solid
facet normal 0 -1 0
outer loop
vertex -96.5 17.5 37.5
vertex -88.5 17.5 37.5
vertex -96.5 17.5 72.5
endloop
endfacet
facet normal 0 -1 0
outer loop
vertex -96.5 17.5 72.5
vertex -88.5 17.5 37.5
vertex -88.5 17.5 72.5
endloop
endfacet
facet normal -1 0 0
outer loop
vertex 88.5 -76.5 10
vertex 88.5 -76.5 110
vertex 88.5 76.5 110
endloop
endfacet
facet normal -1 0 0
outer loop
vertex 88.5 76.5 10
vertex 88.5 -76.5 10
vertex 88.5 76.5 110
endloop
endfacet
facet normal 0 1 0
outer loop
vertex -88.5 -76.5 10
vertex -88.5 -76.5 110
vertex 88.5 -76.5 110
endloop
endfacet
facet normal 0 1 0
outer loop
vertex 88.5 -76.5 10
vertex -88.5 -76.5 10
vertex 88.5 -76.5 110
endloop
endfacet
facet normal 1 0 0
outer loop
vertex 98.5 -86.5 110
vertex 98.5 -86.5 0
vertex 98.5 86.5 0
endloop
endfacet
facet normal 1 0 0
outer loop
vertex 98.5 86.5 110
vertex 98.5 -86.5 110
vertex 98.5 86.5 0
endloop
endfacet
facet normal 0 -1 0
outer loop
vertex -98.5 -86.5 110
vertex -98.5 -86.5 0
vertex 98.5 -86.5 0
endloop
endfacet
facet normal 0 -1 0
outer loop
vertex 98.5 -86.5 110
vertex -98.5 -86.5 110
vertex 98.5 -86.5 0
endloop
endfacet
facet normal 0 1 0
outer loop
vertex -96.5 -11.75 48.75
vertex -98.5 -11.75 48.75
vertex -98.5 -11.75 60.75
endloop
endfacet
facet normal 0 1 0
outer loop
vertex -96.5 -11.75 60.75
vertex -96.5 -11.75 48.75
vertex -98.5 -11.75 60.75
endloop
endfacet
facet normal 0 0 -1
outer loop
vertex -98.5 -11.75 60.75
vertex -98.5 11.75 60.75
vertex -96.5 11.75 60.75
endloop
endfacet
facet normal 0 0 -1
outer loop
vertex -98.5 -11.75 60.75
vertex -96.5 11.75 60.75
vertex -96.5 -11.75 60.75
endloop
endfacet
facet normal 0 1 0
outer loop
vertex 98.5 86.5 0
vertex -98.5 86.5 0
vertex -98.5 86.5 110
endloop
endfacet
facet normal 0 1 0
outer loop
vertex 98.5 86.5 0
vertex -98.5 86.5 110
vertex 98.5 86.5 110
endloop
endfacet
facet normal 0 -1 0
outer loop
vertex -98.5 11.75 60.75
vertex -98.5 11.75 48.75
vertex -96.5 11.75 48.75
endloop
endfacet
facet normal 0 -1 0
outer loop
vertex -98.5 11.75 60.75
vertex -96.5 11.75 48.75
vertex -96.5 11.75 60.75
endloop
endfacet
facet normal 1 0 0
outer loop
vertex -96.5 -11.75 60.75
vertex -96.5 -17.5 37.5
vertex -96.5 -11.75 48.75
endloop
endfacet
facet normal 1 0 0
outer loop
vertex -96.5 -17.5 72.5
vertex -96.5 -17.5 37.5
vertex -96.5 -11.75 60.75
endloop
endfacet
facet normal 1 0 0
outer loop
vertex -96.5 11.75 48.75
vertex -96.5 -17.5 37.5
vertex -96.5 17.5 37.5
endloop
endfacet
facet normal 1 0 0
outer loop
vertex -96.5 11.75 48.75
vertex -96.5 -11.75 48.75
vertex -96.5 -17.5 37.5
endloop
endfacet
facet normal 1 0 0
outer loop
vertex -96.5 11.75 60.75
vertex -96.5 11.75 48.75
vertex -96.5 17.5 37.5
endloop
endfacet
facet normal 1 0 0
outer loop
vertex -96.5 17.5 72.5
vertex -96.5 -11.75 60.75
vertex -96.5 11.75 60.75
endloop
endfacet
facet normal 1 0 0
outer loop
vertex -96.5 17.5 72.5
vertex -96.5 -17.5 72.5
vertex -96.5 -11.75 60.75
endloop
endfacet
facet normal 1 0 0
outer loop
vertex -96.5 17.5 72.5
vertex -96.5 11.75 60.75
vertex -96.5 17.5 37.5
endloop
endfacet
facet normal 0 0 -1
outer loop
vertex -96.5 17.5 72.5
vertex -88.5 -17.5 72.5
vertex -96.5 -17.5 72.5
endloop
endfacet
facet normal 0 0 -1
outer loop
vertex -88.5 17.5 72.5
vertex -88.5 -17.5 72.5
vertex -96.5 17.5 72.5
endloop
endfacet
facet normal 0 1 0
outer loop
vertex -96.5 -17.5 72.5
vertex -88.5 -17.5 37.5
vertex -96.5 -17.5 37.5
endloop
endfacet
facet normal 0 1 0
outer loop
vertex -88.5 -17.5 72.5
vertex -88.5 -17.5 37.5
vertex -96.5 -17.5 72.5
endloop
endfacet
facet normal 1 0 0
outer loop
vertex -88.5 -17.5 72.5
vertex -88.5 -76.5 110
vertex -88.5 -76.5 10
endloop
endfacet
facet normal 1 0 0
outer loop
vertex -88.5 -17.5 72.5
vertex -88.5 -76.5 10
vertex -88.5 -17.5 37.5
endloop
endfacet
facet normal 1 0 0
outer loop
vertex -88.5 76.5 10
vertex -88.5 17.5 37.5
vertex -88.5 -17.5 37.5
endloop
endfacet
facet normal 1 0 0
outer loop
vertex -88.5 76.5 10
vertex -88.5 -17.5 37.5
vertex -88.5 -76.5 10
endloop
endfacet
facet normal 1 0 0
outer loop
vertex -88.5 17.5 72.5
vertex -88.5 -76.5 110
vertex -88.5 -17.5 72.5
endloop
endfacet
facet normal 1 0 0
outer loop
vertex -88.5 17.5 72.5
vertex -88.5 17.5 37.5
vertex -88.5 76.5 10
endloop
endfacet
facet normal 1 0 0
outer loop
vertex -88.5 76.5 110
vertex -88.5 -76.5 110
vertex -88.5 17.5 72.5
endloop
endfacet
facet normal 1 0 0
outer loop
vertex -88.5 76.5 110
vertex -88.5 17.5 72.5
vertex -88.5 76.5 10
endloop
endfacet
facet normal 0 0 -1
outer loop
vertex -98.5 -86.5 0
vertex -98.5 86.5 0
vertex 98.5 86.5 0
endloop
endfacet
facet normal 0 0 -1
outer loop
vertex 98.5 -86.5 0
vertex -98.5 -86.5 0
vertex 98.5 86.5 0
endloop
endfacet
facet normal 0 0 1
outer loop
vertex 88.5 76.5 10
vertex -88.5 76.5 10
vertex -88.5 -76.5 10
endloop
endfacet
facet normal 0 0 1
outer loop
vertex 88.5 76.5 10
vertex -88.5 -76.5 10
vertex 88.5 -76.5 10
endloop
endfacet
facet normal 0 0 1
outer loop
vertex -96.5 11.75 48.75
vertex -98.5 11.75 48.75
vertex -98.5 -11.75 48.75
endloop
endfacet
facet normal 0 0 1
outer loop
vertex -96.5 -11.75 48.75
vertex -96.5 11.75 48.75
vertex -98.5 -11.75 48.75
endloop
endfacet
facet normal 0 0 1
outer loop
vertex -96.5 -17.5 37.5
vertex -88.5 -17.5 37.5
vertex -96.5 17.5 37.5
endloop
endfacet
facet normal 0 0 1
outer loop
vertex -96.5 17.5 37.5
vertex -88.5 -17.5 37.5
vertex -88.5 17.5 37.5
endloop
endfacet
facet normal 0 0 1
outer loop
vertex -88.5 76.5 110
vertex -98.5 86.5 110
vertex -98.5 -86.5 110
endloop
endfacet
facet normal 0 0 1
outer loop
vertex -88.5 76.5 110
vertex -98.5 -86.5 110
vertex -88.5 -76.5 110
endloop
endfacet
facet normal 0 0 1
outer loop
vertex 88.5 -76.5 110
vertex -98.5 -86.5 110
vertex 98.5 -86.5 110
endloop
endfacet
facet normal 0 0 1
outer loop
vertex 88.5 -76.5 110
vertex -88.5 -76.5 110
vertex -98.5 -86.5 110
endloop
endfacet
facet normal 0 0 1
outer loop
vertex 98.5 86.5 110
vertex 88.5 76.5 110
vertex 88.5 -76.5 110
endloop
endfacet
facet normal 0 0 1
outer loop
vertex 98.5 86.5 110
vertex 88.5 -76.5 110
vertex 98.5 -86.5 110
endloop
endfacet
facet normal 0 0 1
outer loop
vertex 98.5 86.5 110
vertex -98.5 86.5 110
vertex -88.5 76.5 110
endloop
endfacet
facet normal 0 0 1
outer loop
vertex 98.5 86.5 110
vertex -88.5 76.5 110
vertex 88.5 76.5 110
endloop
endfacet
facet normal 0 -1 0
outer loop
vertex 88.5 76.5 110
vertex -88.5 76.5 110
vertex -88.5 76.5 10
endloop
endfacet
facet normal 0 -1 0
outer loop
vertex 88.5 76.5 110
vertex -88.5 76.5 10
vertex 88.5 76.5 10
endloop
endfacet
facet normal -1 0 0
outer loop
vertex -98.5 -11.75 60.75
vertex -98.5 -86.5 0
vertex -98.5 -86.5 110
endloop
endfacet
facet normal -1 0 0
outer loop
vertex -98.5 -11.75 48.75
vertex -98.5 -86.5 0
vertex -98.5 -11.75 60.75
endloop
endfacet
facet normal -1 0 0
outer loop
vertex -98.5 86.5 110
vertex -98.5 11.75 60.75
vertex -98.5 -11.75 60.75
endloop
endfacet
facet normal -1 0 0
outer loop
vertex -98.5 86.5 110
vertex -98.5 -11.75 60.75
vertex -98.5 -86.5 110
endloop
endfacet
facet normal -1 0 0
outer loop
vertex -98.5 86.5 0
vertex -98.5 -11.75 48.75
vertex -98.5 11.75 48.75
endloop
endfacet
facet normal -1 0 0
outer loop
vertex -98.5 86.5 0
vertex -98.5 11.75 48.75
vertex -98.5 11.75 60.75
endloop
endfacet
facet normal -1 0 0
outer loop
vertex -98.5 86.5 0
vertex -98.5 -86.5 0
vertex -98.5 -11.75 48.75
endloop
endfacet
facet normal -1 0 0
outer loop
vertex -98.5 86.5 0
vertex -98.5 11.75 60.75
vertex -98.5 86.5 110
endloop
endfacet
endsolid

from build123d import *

# Parameters (mm, degrees)
SKETCH001_W     = 197
SKETCH001_H     = 173
PAD_DEPTH       = 110
SKETCH_W        = 177
SKETCH_H        = 153
POCKET_DEPTH    = 100
SKETCH002_W     = 23.5
SKETCH002_H     = 12
POCKET001_DEPTH = 20
SKETCH003_W     = 35
SKETCH003_H     = 35
POCKET002_DEPTH = 8


with BuildPart() as part:
    # Sketch001 → Pad (new body)
    with BuildSketch(Plane.XY):
        Rectangle(SKETCH001_W, SKETCH001_H)
    extrude(amount=PAD_DEPTH)

    # Sketch (on Face6 of Pad) → Pocket (cut)
    with BuildSketch(Plane.XY.offset(110)):
        Rectangle(SKETCH_W, SKETCH_H)
    extrude(amount=-POCKET_DEPTH, mode=Mode.SUBTRACT)

    # Sketch002 (on Face2 of Pocket) → Pocket001 (cut)
    with BuildSketch(Plane(origin=(-98.5, 0, 0), x_dir=(0, -1, 0), z_dir=(-1, 0, 0))):
        with Locations((0, 54.75)):
            Rectangle(SKETCH002_W, SKETCH002_H)
    extrude(amount=-POCKET001_DEPTH, mode=Mode.SUBTRACT)

    # Sketch003 (on Face11 of Pocket001) → Pocket002 (cut)
    with BuildSketch(Plane.YZ.offset(-88.5)):
        with Locations((0, 55)):
            Rectangle(SKETCH003_W, SKETCH003_H)
    extrude(amount=-POCKET002_DEPTH, mode=Mode.SUBTRACT)


solid = part.part
